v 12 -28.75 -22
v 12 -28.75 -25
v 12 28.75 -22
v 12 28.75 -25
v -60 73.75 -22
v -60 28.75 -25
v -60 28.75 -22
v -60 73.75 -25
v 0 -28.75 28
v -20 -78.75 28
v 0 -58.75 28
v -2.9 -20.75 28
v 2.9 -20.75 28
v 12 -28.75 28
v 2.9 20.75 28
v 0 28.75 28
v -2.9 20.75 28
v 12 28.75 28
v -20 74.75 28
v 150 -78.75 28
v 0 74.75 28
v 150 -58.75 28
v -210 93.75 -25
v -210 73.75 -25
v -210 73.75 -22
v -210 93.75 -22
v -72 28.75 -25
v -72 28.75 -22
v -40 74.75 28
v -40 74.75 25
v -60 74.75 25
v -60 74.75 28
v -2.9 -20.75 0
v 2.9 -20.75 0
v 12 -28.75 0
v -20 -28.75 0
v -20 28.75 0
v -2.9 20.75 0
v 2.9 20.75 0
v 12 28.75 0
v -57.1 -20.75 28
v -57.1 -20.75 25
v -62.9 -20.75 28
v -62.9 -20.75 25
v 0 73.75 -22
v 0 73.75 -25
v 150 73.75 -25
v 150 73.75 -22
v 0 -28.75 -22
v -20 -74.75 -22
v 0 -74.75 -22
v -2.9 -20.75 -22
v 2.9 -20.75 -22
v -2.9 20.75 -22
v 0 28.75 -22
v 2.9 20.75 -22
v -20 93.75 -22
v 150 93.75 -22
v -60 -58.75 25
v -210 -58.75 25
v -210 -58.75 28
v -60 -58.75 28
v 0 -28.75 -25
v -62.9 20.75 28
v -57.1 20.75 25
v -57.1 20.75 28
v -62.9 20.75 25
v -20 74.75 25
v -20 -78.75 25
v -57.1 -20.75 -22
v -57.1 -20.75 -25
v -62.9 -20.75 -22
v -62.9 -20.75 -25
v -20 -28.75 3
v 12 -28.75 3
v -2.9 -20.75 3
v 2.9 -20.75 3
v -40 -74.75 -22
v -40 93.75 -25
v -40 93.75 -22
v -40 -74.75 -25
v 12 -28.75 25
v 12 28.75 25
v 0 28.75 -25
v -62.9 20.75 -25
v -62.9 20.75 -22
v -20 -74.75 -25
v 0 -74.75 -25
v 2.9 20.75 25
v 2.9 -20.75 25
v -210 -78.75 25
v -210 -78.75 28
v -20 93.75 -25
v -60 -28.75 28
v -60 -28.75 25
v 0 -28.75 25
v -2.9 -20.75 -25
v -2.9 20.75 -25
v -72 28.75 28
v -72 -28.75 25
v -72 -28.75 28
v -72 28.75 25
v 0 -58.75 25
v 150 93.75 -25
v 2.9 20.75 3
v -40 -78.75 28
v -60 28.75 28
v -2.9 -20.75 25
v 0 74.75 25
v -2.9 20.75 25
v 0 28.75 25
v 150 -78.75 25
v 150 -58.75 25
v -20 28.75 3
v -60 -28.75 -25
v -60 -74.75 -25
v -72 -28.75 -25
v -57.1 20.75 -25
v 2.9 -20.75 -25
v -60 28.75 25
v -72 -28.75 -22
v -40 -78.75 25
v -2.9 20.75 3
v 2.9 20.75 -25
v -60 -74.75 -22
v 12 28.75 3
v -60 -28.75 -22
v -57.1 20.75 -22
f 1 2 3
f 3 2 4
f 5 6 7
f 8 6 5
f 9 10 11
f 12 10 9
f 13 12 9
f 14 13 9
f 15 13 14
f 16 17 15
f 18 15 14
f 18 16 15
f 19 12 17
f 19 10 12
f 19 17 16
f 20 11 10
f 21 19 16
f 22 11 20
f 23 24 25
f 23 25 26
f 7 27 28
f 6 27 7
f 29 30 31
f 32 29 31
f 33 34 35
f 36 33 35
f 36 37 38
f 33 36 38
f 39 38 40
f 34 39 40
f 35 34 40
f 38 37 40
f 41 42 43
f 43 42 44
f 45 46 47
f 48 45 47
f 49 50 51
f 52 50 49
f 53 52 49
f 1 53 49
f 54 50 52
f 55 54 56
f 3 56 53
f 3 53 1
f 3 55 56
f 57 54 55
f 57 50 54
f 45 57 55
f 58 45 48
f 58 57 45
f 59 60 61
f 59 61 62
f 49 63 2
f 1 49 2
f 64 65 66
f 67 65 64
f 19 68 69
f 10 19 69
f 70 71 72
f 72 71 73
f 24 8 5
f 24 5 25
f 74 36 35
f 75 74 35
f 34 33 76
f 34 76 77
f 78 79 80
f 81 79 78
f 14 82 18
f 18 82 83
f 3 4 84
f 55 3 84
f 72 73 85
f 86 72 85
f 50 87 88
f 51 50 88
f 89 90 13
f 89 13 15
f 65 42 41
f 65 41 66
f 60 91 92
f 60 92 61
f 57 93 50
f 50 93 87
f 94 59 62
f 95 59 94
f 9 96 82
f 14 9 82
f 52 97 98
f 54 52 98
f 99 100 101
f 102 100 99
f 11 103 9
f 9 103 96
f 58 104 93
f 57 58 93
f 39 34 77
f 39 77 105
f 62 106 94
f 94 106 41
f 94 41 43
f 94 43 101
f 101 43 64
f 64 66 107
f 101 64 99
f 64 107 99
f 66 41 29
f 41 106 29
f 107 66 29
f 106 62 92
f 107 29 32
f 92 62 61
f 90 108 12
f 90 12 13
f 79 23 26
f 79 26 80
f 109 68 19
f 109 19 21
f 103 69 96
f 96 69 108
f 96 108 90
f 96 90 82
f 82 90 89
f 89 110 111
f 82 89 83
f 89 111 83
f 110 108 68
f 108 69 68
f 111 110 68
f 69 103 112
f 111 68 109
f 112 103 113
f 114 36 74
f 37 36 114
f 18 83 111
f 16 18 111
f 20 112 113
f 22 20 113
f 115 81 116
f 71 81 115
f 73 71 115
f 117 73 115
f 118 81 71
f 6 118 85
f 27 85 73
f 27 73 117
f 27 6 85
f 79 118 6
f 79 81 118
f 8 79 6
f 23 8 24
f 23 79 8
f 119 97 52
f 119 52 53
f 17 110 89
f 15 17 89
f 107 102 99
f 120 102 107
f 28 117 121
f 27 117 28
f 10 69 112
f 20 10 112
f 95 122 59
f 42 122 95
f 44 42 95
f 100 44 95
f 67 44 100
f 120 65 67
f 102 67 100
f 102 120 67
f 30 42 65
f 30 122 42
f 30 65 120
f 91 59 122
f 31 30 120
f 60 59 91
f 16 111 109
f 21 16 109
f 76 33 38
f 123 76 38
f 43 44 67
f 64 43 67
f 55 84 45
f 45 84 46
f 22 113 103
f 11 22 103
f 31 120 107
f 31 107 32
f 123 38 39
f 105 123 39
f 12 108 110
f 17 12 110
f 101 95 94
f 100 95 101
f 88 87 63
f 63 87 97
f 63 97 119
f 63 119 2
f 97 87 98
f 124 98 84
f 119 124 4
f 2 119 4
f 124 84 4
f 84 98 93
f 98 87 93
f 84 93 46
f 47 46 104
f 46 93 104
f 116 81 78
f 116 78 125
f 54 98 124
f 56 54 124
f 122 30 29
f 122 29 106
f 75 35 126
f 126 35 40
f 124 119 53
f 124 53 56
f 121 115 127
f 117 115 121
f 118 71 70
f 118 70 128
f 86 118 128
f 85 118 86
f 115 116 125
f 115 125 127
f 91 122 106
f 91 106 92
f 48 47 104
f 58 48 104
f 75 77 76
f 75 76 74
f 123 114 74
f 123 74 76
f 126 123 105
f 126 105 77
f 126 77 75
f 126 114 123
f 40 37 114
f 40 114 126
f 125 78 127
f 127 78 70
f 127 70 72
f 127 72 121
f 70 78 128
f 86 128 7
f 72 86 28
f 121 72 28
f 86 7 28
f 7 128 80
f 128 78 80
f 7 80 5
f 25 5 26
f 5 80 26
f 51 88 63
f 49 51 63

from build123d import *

# Parameters (mm, degrees)
F0_W      = 32
F0_H      = 57.5
F0_W_2    = 5.8
F0_H_2    = 41.5
F1_DEPTH  = 3
F3_W      = 5.8
F3_H      = 41.5
F3_W_2    = 20
F3_H_2    = 30
F3_H_3    = 46
F4_DEPTH  = 3
F9_W      = 20
F9_H      = 45
F9_W_2    = 5.8
F9_H_2    = 41.5
F9_H_3    = 46
F10_DEPTH = 3


# Not quite as in the source:
# - a feature names something its author has since deleted; it is built from what else it names


with BuildPart() as f1:
    # F0 (on Top) → F1 (new body)
    with BuildSketch(Plane.XY):
        with Locations((-4, 0)):
            Rectangle(F0_W, F0_H)
        Rectangle(F0_W_2, F0_H_2, mode=Mode.SUBTRACT)
    extrude(amount=F1_DEPTH)


with BuildPart() as f4:
    # F3 (on offset) → F4 (new body)
    with BuildSketch(Plane.XY.offset(25)):
        Polygon((0, 28.75), (-20, 28.75), (-20, -28.75), (0, -28.75), (12, -28.75), (12, 28.75), align=None)
        Rectangle(F3_W, F3_H, mode=Mode.SUBTRACT)
        with Locations((-10, -43.75)):
            Rectangle(F3_W_2, F3_H_2)
        Polygon((0, -58.75), (-20, -58.75), (-20, -78.75), (150, -78.75), (150, -58.75), align=None)
        with Locations((-10, 51.75)):
            Rectangle(F3_W_2, F3_H_3)
    extrude(amount=F4_DEPTH)


with BuildPart() as f6_1:
    # F6: instance of F4
    add(f4.part.mirror(Plane.YZ.offset(-30)))


with BuildPart() as f10:
    # F9 (on offset) → F10 (new body)
    with BuildSketch(Plane.XY.offset(-25)):
        Polygon((-20, 93.75), (-20, 73.75), (0, 73.75), (150, 73.75), (150, 93.75), align=None)
        with Locations((-10, 51.25)):
            Rectangle(F9_W, F9_H)
        Polygon((-20, 28.75), (-20, -28.75), (0, -28.75), (12, -28.75), (12, 28.75), (0, 28.75), align=None)
        Rectangle(F9_W_2, F9_H_2, mode=Mode.SUBTRACT)
        with Locations((-10, -51.75)):
            Rectangle(F9_W, F9_H_3)
    extrude(amount=F10_DEPTH)


with BuildPart() as f11_1:
    # F11: instance of F10
    add(f10.part.mirror(Plane.YZ.offset(-30)))


solid = Compound([f1.part, f4.part, f6_1.part, f10.part, f11_1.part])
